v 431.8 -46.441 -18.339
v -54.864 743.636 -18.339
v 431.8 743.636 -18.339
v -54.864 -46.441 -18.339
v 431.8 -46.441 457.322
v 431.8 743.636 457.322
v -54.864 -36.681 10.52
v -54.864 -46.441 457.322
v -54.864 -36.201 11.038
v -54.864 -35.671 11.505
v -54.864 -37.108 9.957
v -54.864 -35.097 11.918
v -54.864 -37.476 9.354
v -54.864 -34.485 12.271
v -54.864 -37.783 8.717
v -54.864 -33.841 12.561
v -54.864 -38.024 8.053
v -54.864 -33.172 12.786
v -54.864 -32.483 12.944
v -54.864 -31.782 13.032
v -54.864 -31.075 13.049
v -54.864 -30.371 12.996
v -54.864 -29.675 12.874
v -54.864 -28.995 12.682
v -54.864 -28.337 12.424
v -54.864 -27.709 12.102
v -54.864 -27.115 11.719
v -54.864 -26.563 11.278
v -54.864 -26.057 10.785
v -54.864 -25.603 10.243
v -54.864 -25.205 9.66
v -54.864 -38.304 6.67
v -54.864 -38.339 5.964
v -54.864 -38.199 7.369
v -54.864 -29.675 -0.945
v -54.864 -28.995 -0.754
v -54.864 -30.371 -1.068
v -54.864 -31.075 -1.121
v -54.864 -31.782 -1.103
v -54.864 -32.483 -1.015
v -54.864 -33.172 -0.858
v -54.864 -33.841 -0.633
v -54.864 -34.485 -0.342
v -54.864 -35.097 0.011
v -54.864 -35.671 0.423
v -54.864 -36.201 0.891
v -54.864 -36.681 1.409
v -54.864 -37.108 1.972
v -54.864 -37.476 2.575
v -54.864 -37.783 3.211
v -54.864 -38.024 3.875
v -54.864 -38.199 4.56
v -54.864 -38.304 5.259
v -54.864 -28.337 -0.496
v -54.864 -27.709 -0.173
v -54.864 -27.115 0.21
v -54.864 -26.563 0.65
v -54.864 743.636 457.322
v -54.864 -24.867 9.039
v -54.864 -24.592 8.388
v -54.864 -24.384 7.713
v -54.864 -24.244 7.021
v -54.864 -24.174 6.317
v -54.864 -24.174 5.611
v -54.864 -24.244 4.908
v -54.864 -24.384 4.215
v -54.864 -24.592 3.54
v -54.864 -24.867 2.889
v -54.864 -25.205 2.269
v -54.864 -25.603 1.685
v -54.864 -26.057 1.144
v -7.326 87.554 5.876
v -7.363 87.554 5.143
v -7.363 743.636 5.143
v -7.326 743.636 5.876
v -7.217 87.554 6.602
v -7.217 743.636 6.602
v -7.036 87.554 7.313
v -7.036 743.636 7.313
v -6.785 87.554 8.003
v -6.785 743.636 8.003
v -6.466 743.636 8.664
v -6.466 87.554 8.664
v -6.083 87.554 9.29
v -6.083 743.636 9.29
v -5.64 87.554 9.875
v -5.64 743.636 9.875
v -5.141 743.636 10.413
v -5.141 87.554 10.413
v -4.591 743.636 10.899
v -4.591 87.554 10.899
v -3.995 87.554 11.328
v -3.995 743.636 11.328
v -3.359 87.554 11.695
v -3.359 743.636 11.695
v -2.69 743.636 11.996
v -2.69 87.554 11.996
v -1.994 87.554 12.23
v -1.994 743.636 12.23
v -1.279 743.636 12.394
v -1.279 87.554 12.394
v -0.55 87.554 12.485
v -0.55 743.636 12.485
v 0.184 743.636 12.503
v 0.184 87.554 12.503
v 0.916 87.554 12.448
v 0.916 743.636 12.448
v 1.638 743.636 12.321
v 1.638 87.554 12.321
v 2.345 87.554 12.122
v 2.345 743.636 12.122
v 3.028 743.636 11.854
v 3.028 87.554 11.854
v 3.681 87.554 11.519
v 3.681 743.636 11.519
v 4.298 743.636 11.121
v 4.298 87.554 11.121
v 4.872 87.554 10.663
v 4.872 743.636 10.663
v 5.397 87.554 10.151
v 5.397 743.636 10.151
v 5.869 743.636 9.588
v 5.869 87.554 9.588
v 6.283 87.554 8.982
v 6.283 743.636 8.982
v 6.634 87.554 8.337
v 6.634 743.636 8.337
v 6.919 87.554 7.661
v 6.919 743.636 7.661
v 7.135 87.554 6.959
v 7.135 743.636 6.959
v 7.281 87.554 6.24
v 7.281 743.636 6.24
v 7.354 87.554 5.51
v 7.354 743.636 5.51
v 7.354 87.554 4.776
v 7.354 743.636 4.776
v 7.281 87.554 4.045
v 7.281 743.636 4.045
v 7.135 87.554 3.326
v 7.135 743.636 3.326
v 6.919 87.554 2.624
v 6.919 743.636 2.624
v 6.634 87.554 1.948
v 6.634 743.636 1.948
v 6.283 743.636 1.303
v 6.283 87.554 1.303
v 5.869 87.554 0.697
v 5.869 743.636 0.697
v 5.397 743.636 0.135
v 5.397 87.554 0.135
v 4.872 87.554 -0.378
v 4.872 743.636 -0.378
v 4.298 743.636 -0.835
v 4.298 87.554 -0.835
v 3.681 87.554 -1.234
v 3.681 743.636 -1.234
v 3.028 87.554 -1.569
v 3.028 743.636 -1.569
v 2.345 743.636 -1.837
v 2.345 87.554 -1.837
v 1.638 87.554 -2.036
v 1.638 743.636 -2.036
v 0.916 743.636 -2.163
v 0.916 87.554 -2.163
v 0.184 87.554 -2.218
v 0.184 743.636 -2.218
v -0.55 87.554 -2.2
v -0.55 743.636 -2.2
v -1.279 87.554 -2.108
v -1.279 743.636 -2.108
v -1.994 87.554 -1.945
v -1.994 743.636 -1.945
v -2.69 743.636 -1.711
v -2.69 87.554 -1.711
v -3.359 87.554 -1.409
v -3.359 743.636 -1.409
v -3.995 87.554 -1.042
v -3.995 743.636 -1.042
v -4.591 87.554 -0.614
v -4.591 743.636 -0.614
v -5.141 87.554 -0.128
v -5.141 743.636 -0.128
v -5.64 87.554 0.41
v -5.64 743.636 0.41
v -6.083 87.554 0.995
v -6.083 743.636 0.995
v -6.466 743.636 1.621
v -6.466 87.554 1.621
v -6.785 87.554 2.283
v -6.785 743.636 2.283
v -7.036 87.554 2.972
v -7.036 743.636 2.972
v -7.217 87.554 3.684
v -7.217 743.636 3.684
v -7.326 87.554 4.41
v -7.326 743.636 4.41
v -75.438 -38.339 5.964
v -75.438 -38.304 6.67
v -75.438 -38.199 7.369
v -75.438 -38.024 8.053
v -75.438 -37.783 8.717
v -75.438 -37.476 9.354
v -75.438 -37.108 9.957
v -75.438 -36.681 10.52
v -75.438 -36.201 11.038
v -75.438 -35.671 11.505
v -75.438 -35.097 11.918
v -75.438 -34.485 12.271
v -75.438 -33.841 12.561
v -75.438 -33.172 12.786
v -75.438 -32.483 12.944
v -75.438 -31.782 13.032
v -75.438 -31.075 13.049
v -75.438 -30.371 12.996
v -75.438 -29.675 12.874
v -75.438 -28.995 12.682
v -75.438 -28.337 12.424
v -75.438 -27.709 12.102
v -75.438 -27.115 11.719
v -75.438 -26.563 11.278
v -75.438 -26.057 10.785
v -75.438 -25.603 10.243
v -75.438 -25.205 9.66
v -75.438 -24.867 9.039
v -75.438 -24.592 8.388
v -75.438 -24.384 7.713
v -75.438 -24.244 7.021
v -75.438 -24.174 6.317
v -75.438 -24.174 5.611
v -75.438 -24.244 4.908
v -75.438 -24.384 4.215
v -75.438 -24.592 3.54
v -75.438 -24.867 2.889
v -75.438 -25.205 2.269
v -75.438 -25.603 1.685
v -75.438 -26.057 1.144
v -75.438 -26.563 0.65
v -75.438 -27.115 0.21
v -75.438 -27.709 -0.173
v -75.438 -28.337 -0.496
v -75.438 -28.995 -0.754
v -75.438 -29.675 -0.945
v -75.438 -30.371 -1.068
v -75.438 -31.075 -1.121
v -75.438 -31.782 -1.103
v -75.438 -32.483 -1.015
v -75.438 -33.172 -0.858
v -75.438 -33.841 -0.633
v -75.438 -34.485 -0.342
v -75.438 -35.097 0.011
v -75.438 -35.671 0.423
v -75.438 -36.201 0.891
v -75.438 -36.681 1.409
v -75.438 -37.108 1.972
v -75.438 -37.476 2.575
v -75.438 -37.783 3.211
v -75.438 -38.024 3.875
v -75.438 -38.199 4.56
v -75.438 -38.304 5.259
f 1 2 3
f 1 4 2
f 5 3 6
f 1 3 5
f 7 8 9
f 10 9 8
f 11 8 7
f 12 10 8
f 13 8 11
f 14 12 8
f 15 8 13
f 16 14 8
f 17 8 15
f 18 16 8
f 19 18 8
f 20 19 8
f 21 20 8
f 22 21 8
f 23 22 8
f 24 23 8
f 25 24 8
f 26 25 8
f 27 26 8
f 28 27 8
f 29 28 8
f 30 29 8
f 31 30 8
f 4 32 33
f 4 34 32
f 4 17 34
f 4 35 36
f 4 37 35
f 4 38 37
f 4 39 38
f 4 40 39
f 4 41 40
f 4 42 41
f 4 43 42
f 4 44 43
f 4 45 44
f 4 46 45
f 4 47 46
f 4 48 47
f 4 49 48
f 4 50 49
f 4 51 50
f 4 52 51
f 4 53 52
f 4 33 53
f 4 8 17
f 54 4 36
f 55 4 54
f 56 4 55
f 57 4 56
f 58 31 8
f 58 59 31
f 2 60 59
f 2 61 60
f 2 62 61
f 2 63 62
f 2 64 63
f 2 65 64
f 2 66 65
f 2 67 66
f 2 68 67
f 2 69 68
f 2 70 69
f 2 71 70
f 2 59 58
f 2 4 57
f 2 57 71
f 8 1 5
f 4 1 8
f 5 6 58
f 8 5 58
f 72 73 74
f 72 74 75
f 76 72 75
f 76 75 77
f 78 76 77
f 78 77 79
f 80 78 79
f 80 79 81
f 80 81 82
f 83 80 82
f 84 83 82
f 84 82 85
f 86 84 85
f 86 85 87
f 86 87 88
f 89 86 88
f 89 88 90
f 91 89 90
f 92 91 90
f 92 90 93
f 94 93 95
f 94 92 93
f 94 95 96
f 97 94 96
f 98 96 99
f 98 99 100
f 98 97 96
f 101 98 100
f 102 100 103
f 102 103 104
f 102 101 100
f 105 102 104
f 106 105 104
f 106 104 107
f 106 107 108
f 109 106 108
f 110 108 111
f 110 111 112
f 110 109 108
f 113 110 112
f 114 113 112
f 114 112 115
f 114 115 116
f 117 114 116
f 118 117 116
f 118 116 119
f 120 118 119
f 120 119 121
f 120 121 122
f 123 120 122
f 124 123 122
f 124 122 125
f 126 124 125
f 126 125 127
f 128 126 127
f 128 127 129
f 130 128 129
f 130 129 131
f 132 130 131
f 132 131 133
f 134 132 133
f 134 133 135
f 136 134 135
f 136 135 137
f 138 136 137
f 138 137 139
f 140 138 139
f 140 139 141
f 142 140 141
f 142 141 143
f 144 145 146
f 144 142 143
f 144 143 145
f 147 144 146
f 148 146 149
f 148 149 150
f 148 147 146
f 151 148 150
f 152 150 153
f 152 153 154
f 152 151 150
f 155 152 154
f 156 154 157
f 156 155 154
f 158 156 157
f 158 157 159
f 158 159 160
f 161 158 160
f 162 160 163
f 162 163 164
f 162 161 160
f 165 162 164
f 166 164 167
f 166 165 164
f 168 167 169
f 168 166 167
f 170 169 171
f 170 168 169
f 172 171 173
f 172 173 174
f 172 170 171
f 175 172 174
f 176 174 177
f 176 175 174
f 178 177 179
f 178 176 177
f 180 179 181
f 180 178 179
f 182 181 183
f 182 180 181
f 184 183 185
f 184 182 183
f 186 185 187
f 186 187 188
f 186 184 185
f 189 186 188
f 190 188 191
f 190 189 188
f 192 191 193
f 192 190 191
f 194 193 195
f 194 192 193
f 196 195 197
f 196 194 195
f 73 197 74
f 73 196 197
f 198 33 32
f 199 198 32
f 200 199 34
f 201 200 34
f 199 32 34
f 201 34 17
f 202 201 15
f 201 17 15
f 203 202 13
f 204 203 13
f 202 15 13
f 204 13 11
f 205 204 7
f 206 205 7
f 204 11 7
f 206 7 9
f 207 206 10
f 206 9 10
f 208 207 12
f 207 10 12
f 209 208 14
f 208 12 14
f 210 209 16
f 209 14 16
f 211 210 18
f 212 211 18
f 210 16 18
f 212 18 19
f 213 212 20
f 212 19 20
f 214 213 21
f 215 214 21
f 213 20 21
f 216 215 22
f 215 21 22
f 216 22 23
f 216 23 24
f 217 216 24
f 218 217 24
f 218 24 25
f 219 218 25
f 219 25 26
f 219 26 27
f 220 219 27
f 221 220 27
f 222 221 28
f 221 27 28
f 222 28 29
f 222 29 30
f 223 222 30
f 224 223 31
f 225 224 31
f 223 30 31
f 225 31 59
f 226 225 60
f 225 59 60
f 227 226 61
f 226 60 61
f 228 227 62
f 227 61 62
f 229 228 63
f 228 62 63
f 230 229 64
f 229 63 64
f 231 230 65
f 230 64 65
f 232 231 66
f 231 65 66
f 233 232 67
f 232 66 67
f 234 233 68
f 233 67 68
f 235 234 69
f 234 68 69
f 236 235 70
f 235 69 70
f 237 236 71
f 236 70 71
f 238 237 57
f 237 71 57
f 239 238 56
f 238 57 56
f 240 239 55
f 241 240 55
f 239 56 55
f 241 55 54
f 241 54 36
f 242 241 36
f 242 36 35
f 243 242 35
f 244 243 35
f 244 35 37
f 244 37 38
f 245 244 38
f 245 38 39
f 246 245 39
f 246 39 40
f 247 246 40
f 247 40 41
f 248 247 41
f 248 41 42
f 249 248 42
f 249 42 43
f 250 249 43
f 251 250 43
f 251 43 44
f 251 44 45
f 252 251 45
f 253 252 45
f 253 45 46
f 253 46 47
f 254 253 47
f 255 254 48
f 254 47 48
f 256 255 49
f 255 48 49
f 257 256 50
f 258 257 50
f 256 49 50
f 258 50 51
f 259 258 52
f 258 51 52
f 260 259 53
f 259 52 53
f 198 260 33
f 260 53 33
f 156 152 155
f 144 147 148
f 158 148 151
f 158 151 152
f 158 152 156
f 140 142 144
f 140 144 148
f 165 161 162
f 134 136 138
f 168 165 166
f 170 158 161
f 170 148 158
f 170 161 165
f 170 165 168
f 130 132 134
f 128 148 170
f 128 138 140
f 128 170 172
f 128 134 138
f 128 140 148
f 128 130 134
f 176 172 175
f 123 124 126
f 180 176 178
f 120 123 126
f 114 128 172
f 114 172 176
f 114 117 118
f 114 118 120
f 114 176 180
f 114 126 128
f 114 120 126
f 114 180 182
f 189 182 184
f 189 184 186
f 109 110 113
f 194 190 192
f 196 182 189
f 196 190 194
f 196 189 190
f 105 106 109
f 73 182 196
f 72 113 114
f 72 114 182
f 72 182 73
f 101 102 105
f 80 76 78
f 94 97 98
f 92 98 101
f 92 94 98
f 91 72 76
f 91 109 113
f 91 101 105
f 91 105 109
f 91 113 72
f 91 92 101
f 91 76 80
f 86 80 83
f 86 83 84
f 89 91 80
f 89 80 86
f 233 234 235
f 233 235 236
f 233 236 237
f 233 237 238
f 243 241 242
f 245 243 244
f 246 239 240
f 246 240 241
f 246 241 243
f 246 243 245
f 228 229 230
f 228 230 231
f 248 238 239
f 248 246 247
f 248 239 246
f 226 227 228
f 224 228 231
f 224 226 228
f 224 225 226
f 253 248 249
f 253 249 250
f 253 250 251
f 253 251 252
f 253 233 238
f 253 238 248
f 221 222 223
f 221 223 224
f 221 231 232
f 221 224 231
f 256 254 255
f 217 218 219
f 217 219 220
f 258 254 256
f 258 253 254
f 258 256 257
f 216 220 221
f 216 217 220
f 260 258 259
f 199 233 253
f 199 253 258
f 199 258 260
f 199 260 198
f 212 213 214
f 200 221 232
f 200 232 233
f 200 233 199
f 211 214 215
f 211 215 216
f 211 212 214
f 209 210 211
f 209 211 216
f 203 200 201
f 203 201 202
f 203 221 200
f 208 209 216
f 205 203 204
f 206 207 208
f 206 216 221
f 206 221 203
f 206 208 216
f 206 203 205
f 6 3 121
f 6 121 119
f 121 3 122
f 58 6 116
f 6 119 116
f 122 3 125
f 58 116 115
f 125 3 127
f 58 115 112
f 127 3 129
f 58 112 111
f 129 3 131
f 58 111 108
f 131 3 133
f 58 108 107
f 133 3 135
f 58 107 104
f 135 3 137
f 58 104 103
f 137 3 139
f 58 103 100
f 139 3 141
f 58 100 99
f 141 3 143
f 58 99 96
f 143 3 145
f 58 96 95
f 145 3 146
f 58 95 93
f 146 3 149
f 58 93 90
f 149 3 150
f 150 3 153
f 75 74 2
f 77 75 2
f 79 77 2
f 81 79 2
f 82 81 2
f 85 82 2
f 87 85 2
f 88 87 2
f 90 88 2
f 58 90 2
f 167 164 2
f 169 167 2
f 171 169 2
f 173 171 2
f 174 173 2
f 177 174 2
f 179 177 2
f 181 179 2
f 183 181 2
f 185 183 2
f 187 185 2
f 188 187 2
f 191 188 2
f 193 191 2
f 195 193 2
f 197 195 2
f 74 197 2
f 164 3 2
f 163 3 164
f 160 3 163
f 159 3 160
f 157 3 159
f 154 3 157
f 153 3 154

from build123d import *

# Parameters (mm, degrees)
F0_W      = 82.4321992695
F0_H      = 43.8606161624
F1_DEPTH  = 431.8
F2_DEPTH  = 54.864
F3_R      = 7.0871309168
F4_DEPTH  = 20.574
F5_R      = 7.362788809
F6_DEPTH  = 14.478
F7_DEPTH  = 34.544
F8_DEPTH  = 37.084
F9_DEPTH  = 673.1
F10_DEPTH = 431.8


with BuildPart() as f1:
    # F0 (on Right) → F1 (new body)
    with BuildSketch(Plane.YZ):
        with Locations((-5.2245799452, 3.5912198946)):
            Rectangle(F0_W, F0_H)
    extrude(amount=F1_DEPTH)

    # F2 (add): a face of the model
    f2_faces = [f1.faces().sort_by_distance(p)[0] for p in [
        (0, -5.2245799452, 3.5912198946),
    ]]
    extrude(f2_faces, amount=F2_DEPTH)

    # F3 (on face) → F4 (join)
    with BuildSketch(Plane(origin=(-54.864, 0, 0), x_dir=(0, -1, 0), z_dir=(-1, 0, 0))):
        with Locations((31.2521867454, 5.9642316774)):
            Circle(F3_R)
    extrude(amount=F4_DEPTH)

    # F5 (on face) → F6 (join)
    with BuildSketch(Plane(origin=(0, 35.9915196896, 0), x_dir=(-1, 0, 0), z_dir=(0, 1, 0))):
        with Locations((0, 5.1426673308)):
            Circle(F5_R)
    extrude(amount=F6_DEPTH)

    # F7 (add): a face of the model
    f7_faces = [f1.faces().sort_by_distance(p)[0] for p in [
        (189.9838185674, 35.9915196896, 3.5787418462),
    ]]
    extrude(f7_faces, amount=F7_DEPTH)

    # F8 (add): a face of the model
    f8_faces = [f1.faces().sort_by_distance(p)[0] for p in [
        (0, 50.4695196896, 5.1426673308),
    ]]
    extrude(f8_faces, amount=F8_DEPTH)

    # F9 (add): a face of the model
    f9_faces = [f1.faces().sort_by_distance(p)[0] for p in [
        (189.9838185674, 70.5355196896, 3.5787418462),
    ]]
    extrude(f9_faces, amount=F9_DEPTH)

    # F10 (add): a face of the model
    f10_faces = [f1.faces().sort_by_distance(p)[0] for p in [
        (188.468, 348.5974200548, 25.5215279758),
    ]]
    extrude(f10_faces, amount=F10_DEPTH)


solid = f1.part
